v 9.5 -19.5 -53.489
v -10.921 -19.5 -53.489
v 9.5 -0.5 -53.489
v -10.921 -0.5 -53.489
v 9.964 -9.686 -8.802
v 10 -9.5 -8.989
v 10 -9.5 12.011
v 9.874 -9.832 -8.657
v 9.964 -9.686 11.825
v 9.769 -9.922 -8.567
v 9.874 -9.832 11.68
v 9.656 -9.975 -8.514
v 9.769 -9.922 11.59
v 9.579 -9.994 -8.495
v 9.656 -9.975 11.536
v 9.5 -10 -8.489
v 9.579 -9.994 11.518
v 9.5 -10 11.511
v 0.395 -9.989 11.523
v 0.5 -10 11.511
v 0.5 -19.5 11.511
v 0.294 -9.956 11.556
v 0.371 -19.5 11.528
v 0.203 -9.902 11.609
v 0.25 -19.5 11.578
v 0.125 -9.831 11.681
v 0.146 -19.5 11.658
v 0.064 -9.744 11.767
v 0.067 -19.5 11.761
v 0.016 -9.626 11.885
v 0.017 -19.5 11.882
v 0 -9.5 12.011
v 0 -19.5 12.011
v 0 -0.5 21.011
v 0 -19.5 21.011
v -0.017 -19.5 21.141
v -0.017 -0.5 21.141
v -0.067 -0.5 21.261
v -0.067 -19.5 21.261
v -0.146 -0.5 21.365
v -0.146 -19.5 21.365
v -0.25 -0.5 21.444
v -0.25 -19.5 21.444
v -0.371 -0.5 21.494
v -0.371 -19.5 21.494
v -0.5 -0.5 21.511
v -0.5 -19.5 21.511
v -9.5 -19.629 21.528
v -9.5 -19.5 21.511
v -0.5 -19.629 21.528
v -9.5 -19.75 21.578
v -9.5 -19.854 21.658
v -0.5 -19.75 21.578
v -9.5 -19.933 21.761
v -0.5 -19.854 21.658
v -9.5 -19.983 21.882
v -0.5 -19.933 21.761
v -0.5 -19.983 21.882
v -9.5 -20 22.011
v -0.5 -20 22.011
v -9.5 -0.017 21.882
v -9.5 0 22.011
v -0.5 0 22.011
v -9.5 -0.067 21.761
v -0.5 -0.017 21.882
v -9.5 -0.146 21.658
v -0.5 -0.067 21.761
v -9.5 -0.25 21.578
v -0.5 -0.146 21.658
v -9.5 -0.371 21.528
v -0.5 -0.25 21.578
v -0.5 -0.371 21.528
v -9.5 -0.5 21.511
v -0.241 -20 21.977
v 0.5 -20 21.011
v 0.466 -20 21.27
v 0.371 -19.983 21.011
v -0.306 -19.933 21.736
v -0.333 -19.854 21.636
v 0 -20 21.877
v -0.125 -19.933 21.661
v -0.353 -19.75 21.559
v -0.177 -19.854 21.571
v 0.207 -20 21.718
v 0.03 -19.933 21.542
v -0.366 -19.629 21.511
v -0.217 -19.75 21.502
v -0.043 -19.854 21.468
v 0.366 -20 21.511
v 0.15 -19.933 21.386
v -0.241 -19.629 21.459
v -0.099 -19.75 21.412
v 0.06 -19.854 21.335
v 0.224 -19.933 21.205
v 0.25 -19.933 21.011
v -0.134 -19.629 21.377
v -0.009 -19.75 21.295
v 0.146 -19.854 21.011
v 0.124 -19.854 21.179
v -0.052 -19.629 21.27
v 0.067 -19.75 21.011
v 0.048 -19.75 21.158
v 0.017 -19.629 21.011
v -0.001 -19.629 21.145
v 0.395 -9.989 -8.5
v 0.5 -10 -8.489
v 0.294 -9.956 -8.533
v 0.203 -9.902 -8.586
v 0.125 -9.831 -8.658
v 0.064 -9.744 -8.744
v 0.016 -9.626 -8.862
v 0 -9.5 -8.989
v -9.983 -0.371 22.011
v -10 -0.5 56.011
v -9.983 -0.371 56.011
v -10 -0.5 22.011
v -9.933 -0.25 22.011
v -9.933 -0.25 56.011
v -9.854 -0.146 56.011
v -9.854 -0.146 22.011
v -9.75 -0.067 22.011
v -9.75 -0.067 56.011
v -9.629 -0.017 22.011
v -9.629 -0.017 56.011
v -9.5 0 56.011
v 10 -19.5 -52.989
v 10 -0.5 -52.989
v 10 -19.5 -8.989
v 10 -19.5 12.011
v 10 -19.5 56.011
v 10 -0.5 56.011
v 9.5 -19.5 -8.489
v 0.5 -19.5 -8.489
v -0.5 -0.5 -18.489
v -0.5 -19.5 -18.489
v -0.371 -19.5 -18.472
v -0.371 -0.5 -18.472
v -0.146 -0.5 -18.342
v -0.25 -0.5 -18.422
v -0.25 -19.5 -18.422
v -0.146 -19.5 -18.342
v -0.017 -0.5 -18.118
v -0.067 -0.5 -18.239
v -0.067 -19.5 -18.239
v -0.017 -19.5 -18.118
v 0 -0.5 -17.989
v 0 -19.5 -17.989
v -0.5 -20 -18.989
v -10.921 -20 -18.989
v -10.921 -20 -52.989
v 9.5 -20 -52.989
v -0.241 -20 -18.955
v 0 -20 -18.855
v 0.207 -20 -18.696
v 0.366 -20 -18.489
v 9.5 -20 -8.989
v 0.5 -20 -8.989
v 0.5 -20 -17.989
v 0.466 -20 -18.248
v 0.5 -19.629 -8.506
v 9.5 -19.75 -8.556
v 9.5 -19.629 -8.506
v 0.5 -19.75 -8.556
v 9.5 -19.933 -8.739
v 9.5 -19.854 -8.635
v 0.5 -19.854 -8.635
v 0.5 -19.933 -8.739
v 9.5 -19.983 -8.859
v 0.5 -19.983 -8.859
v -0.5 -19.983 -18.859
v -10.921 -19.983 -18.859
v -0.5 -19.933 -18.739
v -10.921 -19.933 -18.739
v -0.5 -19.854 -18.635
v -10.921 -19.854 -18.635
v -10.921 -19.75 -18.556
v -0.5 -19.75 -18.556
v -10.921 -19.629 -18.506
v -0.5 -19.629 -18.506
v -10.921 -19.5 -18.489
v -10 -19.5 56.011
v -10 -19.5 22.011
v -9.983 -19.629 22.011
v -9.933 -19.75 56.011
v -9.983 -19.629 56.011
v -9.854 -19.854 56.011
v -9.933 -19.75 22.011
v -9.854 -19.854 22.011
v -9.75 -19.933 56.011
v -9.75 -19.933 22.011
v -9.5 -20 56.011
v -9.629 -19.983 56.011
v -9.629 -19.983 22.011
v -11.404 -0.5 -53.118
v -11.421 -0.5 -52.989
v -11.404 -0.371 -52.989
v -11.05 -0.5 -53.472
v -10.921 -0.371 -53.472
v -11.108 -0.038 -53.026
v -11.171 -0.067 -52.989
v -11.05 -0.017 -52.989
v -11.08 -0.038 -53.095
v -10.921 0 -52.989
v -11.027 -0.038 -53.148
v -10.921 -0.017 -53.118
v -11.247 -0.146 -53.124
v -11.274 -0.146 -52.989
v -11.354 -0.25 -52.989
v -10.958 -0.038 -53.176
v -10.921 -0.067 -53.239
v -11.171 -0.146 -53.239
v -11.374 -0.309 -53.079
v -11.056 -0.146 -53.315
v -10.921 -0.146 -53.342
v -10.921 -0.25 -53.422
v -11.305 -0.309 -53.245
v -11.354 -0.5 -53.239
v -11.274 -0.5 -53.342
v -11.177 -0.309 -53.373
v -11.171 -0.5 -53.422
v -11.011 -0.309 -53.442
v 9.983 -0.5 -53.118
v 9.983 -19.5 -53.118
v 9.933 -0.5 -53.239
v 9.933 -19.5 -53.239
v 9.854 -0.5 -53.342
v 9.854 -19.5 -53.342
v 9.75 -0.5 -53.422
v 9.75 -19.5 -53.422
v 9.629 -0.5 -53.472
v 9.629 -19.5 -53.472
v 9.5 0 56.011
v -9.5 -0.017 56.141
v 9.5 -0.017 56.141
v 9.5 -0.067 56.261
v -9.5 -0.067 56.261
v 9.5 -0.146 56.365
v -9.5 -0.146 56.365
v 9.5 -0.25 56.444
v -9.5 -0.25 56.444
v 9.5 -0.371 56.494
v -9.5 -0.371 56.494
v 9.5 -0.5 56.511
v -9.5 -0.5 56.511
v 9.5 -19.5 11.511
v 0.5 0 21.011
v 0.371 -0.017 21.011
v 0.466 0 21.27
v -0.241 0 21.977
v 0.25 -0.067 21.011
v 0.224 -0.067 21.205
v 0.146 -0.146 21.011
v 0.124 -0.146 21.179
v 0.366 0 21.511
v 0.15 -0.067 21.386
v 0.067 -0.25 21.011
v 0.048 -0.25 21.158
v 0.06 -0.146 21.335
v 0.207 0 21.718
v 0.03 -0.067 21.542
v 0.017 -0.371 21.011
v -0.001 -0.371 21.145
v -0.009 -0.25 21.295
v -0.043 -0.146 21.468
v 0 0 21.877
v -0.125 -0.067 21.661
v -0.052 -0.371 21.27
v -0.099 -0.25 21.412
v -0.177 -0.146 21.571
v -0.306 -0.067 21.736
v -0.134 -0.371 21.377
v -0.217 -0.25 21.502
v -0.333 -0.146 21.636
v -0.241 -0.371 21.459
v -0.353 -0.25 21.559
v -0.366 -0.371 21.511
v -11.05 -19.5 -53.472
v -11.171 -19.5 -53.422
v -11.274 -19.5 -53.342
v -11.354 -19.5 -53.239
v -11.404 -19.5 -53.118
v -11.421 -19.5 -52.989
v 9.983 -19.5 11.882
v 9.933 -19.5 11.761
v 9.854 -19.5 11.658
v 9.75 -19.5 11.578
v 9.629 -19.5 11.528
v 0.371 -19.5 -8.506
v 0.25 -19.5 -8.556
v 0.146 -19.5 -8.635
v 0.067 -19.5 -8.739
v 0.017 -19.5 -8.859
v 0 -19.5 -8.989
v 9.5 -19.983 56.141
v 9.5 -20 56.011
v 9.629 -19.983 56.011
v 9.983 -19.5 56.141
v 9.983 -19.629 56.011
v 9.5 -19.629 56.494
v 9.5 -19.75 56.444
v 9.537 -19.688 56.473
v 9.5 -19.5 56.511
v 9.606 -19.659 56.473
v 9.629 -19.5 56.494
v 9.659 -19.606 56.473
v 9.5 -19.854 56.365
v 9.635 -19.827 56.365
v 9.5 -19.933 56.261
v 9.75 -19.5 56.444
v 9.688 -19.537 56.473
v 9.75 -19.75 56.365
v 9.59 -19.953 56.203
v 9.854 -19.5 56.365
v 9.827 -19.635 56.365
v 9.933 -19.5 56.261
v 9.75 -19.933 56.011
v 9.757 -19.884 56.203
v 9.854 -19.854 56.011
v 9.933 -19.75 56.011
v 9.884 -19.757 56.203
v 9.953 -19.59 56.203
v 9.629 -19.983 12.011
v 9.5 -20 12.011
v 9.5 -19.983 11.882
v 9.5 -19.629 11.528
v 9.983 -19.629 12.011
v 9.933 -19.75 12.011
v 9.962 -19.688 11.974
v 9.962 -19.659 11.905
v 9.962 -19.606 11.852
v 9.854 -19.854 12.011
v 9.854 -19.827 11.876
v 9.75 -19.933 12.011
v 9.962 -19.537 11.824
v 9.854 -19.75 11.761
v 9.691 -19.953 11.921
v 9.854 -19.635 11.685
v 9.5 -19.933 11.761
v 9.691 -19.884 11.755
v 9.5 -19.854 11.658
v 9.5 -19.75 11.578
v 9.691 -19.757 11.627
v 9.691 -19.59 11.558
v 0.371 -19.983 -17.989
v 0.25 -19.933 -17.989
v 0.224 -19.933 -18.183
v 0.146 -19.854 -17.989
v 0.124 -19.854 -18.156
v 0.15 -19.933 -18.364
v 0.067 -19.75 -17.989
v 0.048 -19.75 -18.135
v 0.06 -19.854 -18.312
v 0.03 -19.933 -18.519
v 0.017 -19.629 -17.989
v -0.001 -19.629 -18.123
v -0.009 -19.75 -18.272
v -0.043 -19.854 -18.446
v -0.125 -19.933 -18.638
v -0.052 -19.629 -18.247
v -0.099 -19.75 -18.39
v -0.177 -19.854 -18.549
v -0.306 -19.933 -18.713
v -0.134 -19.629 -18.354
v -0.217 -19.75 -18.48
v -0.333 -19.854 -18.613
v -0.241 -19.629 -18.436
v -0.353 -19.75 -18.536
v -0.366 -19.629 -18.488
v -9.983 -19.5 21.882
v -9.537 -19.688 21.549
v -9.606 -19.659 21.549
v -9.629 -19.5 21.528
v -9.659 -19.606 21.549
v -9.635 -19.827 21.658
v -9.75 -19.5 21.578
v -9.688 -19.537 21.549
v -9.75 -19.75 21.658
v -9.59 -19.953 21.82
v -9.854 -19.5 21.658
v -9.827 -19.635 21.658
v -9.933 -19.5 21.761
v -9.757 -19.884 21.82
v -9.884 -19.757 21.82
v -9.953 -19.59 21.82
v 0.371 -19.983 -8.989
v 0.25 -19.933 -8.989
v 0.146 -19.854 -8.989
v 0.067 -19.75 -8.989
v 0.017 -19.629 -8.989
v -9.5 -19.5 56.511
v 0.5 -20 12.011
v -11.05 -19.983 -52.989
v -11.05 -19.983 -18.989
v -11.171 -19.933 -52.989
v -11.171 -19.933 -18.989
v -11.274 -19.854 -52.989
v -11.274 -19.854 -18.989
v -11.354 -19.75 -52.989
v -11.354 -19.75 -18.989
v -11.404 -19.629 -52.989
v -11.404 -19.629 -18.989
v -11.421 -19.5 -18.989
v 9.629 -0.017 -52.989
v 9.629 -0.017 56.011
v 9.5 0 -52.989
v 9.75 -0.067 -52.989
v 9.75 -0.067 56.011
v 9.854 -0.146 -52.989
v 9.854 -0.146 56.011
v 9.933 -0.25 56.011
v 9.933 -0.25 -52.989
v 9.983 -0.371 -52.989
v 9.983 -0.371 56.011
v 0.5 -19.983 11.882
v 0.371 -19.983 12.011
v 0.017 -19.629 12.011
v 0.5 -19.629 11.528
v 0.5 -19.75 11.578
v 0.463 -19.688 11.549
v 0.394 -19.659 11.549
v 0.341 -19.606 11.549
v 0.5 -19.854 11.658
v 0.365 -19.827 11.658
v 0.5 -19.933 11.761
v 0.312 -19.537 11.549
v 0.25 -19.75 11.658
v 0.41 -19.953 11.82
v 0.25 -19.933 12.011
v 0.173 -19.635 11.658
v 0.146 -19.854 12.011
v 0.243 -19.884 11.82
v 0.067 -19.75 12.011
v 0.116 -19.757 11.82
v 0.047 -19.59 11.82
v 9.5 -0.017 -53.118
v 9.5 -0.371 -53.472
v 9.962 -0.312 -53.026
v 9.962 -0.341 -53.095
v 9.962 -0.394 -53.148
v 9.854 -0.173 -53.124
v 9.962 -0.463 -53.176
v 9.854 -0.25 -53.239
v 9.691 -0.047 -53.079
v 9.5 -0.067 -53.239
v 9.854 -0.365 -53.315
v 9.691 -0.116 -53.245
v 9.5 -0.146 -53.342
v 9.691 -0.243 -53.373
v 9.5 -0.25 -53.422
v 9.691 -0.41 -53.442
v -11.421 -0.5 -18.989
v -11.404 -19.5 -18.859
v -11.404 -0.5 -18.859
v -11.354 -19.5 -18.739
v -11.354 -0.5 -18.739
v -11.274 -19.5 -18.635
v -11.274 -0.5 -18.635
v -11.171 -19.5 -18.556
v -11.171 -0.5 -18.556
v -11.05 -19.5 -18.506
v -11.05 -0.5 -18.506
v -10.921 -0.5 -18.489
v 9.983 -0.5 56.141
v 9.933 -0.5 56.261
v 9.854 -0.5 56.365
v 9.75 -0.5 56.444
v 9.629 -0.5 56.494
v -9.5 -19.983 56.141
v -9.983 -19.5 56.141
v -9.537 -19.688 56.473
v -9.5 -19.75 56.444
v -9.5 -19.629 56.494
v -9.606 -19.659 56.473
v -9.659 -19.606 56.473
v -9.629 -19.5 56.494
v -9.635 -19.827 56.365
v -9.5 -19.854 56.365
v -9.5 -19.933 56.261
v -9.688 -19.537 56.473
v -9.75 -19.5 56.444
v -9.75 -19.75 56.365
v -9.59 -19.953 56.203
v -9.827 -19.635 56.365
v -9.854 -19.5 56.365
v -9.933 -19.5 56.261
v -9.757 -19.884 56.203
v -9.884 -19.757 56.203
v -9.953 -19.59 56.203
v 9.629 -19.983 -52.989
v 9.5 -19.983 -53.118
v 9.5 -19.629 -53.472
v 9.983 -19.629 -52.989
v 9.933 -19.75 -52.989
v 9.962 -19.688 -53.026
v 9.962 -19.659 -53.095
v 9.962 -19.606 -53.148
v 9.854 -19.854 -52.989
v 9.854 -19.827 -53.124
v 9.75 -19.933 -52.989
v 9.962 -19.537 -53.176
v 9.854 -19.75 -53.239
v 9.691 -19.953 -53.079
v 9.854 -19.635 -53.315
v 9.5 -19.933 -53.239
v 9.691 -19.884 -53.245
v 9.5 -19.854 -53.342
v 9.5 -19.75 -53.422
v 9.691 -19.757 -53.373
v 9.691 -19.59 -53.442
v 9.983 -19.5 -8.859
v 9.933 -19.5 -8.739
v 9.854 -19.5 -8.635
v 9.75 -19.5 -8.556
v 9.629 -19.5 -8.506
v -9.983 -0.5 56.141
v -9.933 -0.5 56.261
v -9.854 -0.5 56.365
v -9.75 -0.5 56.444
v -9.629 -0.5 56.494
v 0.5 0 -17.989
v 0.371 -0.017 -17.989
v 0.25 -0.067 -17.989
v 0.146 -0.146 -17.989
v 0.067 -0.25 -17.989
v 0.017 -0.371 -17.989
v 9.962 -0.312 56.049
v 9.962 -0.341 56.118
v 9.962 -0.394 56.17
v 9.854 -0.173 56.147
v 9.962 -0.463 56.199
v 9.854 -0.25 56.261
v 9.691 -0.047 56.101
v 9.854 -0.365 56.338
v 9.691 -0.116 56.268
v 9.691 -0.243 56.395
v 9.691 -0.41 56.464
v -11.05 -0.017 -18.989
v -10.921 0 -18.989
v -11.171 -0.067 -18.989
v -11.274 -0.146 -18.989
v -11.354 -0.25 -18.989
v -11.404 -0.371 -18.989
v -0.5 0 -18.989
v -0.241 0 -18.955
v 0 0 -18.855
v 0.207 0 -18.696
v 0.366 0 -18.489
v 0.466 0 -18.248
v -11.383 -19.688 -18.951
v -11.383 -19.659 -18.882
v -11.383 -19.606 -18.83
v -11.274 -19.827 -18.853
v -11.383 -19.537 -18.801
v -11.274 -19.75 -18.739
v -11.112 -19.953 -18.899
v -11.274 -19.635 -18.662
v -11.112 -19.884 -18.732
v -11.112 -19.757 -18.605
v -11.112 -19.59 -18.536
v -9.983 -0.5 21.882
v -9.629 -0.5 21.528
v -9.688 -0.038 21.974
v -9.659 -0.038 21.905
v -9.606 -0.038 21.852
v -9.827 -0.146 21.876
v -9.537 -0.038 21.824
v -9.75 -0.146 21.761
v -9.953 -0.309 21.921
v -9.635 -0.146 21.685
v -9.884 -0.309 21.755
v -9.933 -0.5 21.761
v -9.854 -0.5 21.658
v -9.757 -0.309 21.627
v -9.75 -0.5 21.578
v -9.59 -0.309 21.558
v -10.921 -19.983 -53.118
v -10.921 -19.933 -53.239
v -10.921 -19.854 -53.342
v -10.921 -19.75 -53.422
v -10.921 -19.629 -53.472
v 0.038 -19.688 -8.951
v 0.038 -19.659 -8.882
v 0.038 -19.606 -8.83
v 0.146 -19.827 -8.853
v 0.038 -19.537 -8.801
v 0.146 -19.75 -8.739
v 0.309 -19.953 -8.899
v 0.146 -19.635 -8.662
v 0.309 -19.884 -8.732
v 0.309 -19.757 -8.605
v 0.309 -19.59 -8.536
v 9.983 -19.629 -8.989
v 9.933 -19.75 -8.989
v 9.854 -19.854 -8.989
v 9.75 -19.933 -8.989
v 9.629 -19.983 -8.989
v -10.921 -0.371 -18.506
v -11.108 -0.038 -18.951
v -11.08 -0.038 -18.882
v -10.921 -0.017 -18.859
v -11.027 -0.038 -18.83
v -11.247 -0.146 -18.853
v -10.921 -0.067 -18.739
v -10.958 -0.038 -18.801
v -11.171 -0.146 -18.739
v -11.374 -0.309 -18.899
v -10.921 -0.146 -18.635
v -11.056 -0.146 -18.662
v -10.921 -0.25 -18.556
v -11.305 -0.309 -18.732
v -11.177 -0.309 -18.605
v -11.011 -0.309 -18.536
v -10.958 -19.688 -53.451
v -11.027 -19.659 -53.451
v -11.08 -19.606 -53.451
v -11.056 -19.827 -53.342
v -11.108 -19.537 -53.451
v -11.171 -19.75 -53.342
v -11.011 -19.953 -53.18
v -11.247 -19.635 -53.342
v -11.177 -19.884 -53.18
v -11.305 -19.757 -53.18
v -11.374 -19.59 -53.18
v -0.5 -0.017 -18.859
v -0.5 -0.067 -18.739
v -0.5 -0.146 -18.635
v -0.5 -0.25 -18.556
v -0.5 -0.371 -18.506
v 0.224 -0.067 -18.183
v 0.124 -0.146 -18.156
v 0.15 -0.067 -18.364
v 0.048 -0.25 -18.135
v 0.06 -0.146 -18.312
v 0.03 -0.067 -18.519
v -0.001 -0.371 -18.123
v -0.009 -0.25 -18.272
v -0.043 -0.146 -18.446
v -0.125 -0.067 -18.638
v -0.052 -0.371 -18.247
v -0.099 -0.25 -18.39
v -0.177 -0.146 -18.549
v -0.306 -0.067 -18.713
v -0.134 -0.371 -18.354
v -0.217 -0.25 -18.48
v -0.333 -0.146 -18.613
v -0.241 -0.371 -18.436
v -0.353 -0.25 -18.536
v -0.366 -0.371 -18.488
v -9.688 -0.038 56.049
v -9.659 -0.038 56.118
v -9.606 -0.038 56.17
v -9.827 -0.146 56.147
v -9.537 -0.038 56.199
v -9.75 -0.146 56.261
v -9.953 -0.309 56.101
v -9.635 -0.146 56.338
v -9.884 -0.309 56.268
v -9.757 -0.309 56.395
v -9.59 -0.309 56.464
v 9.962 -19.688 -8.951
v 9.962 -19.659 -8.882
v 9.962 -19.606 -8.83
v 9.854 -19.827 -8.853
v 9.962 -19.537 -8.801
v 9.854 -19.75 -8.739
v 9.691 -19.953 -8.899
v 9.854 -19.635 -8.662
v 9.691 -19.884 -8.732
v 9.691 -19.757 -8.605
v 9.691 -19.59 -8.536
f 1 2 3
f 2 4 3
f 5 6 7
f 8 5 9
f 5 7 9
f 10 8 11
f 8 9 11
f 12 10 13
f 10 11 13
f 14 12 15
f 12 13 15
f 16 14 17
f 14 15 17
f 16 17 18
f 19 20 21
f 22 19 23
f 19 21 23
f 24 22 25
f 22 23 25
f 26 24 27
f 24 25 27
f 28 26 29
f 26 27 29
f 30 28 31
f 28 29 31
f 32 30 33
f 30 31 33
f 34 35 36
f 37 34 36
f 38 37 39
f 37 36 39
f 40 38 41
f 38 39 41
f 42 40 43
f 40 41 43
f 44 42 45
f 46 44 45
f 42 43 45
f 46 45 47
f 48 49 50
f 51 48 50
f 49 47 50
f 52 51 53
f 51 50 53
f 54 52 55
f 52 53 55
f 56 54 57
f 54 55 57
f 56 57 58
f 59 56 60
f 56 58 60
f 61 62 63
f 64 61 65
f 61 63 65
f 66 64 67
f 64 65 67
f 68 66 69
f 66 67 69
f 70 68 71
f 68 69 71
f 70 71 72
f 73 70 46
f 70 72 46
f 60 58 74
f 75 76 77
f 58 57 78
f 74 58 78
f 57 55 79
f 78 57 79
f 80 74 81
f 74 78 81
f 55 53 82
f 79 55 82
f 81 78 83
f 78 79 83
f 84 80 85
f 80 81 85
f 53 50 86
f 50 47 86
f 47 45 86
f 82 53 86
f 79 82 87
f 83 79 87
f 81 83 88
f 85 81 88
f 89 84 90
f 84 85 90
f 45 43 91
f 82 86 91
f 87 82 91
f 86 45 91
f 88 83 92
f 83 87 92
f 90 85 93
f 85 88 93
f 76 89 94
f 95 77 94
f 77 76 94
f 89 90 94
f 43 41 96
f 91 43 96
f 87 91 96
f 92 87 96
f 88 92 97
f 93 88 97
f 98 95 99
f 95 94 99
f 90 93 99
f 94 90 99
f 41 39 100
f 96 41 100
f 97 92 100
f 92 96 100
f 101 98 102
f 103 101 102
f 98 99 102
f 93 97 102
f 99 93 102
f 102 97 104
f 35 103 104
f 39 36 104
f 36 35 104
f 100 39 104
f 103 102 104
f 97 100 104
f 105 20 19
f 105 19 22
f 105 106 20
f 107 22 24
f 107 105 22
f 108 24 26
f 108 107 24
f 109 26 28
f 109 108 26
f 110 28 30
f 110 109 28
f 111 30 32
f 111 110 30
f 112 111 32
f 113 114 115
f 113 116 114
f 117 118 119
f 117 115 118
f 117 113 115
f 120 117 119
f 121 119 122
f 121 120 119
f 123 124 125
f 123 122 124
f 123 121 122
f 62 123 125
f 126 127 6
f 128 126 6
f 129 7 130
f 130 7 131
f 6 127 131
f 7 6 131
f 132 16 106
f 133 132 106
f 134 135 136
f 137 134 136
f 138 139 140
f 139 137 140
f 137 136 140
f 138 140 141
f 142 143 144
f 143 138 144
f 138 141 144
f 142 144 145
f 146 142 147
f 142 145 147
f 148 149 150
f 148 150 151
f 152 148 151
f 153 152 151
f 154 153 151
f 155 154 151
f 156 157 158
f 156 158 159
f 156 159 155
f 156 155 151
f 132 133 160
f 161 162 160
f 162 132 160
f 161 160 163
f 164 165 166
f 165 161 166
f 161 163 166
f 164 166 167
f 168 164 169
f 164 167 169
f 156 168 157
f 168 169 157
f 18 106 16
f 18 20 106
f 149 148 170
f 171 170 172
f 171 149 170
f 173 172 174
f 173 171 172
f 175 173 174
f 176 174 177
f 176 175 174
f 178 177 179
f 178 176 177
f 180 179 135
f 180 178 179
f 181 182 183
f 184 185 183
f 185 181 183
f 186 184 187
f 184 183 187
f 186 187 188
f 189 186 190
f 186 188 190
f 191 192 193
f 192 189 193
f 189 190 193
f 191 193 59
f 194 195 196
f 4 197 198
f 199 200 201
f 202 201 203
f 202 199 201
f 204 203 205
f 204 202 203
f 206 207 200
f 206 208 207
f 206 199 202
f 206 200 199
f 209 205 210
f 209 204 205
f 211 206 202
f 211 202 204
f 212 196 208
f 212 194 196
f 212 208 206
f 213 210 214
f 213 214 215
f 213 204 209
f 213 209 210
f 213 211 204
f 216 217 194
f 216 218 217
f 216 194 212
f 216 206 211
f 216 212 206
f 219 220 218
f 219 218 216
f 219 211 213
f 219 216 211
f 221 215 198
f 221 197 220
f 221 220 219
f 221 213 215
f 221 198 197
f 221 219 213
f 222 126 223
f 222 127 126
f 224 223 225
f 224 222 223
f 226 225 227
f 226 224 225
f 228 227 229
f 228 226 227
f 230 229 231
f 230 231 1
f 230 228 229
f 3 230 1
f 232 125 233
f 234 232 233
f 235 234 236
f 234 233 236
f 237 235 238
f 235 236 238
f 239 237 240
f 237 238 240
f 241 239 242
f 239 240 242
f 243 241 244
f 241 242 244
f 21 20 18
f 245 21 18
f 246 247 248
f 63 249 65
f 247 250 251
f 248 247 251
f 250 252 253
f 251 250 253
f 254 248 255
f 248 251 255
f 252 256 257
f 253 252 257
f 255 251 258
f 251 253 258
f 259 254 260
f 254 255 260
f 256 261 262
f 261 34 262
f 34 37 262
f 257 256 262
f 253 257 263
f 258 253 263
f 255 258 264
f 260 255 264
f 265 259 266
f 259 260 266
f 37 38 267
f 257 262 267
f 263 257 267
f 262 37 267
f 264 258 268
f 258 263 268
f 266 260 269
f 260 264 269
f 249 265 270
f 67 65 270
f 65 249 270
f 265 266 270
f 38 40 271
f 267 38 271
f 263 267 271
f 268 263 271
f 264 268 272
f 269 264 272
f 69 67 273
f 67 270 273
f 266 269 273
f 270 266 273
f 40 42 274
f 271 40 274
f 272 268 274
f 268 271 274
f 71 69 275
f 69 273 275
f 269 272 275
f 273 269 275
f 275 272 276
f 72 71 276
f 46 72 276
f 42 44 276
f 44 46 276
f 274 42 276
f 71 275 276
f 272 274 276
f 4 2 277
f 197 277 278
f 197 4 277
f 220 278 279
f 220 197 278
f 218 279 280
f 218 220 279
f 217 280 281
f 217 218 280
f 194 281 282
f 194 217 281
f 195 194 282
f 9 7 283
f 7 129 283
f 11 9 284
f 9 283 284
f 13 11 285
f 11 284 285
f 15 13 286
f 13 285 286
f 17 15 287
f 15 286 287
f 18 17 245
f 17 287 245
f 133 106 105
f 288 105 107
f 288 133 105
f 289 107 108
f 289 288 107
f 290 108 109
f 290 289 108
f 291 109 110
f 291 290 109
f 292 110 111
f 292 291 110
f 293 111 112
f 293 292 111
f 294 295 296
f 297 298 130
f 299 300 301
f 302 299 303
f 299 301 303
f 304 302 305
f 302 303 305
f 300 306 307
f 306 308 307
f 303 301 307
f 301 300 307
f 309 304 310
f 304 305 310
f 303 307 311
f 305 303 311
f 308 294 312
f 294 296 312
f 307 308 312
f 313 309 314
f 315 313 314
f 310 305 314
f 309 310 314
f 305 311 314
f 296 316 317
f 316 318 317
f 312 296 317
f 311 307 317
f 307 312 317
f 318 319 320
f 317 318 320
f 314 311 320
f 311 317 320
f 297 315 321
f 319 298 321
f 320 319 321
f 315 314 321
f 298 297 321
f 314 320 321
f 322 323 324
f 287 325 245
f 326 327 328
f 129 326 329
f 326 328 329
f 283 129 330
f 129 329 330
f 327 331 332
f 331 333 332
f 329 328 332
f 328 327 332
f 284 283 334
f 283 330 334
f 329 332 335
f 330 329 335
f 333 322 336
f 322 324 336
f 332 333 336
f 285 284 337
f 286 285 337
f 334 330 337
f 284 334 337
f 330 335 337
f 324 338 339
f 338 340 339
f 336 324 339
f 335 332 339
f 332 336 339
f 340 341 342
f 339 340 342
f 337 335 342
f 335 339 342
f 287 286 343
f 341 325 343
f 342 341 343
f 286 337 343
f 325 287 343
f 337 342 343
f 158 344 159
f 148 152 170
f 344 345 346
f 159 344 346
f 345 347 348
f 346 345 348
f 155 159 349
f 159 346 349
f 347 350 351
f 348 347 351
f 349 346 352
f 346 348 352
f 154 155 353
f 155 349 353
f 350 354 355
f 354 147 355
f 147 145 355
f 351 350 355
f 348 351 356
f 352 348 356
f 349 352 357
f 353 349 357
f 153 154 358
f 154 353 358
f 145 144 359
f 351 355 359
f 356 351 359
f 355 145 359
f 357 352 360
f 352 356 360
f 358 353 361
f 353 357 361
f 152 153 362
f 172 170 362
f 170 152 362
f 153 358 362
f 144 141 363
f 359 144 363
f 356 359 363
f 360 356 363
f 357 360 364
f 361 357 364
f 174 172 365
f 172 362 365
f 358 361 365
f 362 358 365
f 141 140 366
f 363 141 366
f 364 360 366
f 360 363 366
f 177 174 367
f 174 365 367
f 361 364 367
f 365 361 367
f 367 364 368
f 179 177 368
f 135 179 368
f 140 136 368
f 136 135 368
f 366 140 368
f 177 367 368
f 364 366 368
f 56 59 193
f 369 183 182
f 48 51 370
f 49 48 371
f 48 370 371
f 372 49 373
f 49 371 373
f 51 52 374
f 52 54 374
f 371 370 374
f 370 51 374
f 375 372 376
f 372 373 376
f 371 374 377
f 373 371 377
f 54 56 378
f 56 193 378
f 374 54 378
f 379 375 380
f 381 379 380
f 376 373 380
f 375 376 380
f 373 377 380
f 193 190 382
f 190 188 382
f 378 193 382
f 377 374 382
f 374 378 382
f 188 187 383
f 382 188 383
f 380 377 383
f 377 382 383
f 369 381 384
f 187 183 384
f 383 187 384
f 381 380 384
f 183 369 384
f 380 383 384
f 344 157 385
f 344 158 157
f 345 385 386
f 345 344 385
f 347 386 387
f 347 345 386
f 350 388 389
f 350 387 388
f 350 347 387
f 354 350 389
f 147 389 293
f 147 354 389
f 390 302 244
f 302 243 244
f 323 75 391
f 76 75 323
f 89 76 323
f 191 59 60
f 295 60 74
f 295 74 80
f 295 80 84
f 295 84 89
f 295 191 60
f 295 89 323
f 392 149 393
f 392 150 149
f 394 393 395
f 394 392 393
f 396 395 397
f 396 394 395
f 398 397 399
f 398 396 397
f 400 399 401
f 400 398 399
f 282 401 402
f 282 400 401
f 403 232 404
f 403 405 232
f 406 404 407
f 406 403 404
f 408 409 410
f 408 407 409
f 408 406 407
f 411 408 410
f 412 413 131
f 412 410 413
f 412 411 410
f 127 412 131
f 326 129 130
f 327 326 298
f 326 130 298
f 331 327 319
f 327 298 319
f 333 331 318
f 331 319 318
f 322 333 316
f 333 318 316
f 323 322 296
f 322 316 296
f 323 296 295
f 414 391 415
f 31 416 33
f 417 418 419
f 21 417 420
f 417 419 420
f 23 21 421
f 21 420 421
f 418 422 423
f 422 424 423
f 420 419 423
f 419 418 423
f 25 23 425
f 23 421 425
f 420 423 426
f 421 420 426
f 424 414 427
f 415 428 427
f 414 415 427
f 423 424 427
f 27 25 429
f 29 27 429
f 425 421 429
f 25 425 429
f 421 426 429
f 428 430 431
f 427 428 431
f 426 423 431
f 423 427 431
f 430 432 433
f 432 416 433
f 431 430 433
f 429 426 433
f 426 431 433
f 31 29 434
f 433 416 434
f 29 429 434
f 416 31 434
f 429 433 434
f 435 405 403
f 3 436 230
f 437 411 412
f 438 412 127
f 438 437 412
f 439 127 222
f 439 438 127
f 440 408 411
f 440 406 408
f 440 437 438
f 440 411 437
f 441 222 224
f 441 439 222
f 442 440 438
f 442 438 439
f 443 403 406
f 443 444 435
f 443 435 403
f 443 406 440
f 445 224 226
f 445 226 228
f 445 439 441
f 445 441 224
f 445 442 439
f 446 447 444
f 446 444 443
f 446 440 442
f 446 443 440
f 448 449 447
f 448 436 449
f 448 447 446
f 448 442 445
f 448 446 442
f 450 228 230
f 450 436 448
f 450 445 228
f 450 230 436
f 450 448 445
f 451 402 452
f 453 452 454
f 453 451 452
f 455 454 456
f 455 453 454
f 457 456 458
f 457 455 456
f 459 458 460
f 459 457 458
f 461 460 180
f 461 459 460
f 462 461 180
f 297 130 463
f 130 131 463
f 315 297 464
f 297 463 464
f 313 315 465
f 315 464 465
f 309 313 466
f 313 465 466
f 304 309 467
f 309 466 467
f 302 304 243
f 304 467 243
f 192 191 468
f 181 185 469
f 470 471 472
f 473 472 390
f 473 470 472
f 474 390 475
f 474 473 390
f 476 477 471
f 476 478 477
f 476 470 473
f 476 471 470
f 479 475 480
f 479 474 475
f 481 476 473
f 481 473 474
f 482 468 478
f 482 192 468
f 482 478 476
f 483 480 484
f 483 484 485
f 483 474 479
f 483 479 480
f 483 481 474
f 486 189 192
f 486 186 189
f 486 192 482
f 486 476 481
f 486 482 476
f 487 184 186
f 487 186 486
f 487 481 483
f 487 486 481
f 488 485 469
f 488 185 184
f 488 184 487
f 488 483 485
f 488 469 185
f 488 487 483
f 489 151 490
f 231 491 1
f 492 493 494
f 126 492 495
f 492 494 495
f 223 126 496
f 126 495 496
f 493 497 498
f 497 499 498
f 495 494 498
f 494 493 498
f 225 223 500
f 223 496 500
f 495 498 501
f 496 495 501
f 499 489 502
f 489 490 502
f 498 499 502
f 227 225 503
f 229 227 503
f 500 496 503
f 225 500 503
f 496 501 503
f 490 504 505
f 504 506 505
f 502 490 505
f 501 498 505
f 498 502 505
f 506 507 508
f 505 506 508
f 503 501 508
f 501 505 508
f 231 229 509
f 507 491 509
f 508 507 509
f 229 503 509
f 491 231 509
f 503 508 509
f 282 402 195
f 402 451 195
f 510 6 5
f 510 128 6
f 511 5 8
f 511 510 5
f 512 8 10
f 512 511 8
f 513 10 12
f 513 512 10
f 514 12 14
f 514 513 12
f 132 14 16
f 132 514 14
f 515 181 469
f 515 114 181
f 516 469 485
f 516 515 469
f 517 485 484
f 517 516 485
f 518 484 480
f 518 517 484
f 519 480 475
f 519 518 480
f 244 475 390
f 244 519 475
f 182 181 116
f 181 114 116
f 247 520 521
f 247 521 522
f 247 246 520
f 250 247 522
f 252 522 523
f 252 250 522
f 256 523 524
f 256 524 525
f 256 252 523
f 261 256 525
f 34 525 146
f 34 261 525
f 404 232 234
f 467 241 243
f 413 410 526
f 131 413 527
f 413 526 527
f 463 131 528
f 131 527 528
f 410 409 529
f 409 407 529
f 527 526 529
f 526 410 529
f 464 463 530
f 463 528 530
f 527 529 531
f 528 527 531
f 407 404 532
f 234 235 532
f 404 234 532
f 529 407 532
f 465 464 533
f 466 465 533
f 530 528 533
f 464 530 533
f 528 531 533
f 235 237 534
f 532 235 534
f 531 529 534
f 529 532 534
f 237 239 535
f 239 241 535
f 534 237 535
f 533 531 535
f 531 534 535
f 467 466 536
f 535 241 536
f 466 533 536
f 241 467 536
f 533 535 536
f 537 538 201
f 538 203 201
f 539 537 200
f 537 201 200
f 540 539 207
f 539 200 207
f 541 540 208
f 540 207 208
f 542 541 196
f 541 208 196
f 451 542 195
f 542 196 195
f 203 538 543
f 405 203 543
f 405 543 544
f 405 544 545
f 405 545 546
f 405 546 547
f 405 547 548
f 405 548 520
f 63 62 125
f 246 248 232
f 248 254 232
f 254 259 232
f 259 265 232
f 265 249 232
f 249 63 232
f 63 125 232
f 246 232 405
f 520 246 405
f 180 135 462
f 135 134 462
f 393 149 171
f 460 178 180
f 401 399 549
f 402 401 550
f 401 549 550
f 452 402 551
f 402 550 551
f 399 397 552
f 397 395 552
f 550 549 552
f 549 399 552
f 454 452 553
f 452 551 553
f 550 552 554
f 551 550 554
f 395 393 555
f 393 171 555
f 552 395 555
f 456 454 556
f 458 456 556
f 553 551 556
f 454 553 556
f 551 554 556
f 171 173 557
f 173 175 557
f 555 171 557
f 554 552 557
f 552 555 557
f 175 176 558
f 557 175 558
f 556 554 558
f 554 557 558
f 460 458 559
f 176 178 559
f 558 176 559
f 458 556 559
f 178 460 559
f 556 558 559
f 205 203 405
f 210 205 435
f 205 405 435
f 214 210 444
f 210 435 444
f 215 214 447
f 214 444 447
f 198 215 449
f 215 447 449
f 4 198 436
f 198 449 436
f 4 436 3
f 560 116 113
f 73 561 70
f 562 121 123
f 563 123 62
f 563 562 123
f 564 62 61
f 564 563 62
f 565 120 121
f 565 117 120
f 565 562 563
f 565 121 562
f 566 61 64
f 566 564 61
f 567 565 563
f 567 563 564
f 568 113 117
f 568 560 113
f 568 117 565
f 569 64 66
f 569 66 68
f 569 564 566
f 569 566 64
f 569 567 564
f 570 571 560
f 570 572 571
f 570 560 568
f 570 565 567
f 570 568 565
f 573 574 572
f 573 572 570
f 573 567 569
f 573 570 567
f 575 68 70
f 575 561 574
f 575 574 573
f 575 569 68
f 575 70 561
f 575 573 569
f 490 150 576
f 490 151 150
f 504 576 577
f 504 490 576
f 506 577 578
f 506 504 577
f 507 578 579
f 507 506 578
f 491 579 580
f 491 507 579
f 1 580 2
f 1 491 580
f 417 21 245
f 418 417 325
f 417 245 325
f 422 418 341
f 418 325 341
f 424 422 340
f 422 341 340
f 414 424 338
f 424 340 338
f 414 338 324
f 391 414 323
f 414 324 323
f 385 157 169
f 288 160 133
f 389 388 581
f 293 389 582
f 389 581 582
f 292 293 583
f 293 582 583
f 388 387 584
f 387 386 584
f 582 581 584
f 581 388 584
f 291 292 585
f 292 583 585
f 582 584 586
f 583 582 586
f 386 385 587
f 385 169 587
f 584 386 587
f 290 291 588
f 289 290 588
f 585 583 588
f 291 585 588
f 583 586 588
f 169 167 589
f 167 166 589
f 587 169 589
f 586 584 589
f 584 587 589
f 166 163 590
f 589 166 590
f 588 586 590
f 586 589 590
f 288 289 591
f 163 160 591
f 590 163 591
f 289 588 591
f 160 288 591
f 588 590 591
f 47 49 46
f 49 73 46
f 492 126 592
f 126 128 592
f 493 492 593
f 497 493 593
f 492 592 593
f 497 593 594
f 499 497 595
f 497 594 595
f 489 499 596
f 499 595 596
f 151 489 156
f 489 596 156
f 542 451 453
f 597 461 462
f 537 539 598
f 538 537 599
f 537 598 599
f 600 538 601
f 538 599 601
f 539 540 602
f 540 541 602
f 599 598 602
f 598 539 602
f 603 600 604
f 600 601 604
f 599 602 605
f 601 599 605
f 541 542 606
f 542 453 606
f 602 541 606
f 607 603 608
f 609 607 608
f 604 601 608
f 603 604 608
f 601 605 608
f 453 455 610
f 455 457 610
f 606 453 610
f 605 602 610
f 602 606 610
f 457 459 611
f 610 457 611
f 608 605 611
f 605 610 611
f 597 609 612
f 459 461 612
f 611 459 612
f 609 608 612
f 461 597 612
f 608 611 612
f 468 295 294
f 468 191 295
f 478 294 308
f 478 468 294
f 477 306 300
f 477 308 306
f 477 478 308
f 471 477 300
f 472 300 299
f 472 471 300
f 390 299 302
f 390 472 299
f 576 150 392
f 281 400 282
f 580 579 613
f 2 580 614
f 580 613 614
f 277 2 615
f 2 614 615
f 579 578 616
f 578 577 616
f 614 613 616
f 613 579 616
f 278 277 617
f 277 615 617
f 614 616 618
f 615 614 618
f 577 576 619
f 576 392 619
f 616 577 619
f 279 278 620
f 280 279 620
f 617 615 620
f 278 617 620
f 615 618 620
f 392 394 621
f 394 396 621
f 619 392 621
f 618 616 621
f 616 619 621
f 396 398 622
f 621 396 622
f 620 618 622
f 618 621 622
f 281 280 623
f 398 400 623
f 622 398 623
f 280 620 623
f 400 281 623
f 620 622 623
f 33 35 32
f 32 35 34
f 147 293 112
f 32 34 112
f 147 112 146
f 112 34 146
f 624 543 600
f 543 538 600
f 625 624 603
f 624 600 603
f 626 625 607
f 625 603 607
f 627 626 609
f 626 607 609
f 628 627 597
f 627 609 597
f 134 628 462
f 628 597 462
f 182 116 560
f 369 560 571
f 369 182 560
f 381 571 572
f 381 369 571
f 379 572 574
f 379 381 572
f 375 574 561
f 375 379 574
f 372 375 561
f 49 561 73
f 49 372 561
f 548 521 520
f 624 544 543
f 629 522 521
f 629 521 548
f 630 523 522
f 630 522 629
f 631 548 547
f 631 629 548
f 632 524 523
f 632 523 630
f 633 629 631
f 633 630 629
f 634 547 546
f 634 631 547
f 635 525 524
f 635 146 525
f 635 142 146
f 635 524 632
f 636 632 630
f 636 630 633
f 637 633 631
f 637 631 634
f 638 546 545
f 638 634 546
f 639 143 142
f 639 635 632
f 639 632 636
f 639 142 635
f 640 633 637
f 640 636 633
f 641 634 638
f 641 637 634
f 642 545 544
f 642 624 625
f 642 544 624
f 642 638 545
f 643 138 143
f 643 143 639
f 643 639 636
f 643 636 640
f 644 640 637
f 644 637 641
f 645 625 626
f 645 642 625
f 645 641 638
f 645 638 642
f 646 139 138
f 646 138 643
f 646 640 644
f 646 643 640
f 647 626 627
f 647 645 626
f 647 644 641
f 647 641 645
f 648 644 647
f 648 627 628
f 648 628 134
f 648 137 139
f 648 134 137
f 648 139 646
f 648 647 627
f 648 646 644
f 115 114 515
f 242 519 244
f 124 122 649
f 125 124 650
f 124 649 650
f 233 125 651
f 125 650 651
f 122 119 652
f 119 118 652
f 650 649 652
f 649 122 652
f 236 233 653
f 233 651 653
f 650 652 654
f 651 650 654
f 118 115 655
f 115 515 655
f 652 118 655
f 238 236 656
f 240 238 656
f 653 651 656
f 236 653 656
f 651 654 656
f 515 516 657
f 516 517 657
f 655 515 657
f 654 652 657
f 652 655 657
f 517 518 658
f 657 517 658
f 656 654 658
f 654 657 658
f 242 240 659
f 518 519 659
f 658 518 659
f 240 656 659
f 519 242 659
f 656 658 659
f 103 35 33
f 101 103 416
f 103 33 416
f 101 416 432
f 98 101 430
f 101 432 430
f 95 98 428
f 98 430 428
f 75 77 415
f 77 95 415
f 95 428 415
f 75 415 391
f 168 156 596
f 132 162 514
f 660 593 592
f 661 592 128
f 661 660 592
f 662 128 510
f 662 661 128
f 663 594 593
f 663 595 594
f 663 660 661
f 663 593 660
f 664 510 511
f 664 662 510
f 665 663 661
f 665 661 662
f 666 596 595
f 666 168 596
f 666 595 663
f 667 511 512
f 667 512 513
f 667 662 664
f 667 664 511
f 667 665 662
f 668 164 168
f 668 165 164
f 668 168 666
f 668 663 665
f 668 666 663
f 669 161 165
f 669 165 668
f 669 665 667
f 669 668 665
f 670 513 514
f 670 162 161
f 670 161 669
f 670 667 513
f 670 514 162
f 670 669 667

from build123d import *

# Parameters (mm, degrees)
F0_W     = 10
F0_H     = 20
F1_DEPTH = 10
F2_DEPTH = 20
F3_R     = 0.5


with BuildPart() as f1:
    # F0 (on Front) → F1 (new body)
    with BuildSketch(Plane.XZ):
        Polygon((-10, 56.511319), (-10, 21.511319), (0, 21.511319), (0, 11.511319), (10, 11.511319), (10, 56.511319), align=None)
        Polygon((10, -8.488681), (0, -8.488681), (0, -18.488681), (-11.420748, -18.488681), (-11.420748, -53.488681), (10, -53.488681), align=None)
        with Locations((5, 1.511319)):
            Rectangle(F0_W, F0_H)
    extrude(amount=F1_DEPTH)

    # F0 (on Front) → F2 (join)
    with BuildSketch(Plane.XZ):
        Polygon((-10, 56.511319), (-10, 21.511319), (0, 21.511319), (0, 11.511319), (10, 11.511319), (10, 56.511319), align=None)
        Polygon((10, -8.488681), (0, -8.488681), (0, -18.488681), (-11.420748, -18.488681), (-11.420748, -53.488681), (10, -53.488681), align=None)
    extrude(amount=F2_DEPTH)

    # F3
    f3_edges = [f1.edges().sort_by_distance(p)[0] for p in [
        (-10, -20, 39.011319),
        (-5, -20, 21.511319),
        (0, -20, 16.511319),
        (5, -20, 11.511319),
        (10, -20, 34.011319),
        (0, -20, 56.511319),
        (5, -20, -8.488681),
        (0, -20, -13.488681),
        (-5.710374, -20, -18.488681),
        (-11.420748, -20, -35.988681),
        (-0.710374, -20, -53.488681),
        (10, -20, -30.988681),
        (-10, -10, 56.511319),
        (-10, -10, 21.511319),
        (-10, 0, 39.011319),
        (-11.420748, -10, -18.488681),
        (-11.420748, -10, -53.488681),
        (-11.420748, 0, -35.988681),
        (0, -10, 21.511319),
        (0, -15, 11.511319),
        (0, -10, 1.511319),
        (0, -15, -8.488681),
        (0, -10, -18.488681),
        (0, 0, 1.511319),
        (0, 0, 56.511319),
        (-5, 0, 21.511319),
        (-5.710374, 0, -18.488681),
        (-0.710374, 0, -53.488681),
        (10, 0, 1.511319),
        (10, -10, -53.488681),
        (10, -15, -8.488681),
        (10, -10, 1.511319),
        (10, -15, 11.511319),
        (10, -10, 56.511319),
    ]]
    fillet(f3_edges, radius=F3_R)


solid = f1.part
